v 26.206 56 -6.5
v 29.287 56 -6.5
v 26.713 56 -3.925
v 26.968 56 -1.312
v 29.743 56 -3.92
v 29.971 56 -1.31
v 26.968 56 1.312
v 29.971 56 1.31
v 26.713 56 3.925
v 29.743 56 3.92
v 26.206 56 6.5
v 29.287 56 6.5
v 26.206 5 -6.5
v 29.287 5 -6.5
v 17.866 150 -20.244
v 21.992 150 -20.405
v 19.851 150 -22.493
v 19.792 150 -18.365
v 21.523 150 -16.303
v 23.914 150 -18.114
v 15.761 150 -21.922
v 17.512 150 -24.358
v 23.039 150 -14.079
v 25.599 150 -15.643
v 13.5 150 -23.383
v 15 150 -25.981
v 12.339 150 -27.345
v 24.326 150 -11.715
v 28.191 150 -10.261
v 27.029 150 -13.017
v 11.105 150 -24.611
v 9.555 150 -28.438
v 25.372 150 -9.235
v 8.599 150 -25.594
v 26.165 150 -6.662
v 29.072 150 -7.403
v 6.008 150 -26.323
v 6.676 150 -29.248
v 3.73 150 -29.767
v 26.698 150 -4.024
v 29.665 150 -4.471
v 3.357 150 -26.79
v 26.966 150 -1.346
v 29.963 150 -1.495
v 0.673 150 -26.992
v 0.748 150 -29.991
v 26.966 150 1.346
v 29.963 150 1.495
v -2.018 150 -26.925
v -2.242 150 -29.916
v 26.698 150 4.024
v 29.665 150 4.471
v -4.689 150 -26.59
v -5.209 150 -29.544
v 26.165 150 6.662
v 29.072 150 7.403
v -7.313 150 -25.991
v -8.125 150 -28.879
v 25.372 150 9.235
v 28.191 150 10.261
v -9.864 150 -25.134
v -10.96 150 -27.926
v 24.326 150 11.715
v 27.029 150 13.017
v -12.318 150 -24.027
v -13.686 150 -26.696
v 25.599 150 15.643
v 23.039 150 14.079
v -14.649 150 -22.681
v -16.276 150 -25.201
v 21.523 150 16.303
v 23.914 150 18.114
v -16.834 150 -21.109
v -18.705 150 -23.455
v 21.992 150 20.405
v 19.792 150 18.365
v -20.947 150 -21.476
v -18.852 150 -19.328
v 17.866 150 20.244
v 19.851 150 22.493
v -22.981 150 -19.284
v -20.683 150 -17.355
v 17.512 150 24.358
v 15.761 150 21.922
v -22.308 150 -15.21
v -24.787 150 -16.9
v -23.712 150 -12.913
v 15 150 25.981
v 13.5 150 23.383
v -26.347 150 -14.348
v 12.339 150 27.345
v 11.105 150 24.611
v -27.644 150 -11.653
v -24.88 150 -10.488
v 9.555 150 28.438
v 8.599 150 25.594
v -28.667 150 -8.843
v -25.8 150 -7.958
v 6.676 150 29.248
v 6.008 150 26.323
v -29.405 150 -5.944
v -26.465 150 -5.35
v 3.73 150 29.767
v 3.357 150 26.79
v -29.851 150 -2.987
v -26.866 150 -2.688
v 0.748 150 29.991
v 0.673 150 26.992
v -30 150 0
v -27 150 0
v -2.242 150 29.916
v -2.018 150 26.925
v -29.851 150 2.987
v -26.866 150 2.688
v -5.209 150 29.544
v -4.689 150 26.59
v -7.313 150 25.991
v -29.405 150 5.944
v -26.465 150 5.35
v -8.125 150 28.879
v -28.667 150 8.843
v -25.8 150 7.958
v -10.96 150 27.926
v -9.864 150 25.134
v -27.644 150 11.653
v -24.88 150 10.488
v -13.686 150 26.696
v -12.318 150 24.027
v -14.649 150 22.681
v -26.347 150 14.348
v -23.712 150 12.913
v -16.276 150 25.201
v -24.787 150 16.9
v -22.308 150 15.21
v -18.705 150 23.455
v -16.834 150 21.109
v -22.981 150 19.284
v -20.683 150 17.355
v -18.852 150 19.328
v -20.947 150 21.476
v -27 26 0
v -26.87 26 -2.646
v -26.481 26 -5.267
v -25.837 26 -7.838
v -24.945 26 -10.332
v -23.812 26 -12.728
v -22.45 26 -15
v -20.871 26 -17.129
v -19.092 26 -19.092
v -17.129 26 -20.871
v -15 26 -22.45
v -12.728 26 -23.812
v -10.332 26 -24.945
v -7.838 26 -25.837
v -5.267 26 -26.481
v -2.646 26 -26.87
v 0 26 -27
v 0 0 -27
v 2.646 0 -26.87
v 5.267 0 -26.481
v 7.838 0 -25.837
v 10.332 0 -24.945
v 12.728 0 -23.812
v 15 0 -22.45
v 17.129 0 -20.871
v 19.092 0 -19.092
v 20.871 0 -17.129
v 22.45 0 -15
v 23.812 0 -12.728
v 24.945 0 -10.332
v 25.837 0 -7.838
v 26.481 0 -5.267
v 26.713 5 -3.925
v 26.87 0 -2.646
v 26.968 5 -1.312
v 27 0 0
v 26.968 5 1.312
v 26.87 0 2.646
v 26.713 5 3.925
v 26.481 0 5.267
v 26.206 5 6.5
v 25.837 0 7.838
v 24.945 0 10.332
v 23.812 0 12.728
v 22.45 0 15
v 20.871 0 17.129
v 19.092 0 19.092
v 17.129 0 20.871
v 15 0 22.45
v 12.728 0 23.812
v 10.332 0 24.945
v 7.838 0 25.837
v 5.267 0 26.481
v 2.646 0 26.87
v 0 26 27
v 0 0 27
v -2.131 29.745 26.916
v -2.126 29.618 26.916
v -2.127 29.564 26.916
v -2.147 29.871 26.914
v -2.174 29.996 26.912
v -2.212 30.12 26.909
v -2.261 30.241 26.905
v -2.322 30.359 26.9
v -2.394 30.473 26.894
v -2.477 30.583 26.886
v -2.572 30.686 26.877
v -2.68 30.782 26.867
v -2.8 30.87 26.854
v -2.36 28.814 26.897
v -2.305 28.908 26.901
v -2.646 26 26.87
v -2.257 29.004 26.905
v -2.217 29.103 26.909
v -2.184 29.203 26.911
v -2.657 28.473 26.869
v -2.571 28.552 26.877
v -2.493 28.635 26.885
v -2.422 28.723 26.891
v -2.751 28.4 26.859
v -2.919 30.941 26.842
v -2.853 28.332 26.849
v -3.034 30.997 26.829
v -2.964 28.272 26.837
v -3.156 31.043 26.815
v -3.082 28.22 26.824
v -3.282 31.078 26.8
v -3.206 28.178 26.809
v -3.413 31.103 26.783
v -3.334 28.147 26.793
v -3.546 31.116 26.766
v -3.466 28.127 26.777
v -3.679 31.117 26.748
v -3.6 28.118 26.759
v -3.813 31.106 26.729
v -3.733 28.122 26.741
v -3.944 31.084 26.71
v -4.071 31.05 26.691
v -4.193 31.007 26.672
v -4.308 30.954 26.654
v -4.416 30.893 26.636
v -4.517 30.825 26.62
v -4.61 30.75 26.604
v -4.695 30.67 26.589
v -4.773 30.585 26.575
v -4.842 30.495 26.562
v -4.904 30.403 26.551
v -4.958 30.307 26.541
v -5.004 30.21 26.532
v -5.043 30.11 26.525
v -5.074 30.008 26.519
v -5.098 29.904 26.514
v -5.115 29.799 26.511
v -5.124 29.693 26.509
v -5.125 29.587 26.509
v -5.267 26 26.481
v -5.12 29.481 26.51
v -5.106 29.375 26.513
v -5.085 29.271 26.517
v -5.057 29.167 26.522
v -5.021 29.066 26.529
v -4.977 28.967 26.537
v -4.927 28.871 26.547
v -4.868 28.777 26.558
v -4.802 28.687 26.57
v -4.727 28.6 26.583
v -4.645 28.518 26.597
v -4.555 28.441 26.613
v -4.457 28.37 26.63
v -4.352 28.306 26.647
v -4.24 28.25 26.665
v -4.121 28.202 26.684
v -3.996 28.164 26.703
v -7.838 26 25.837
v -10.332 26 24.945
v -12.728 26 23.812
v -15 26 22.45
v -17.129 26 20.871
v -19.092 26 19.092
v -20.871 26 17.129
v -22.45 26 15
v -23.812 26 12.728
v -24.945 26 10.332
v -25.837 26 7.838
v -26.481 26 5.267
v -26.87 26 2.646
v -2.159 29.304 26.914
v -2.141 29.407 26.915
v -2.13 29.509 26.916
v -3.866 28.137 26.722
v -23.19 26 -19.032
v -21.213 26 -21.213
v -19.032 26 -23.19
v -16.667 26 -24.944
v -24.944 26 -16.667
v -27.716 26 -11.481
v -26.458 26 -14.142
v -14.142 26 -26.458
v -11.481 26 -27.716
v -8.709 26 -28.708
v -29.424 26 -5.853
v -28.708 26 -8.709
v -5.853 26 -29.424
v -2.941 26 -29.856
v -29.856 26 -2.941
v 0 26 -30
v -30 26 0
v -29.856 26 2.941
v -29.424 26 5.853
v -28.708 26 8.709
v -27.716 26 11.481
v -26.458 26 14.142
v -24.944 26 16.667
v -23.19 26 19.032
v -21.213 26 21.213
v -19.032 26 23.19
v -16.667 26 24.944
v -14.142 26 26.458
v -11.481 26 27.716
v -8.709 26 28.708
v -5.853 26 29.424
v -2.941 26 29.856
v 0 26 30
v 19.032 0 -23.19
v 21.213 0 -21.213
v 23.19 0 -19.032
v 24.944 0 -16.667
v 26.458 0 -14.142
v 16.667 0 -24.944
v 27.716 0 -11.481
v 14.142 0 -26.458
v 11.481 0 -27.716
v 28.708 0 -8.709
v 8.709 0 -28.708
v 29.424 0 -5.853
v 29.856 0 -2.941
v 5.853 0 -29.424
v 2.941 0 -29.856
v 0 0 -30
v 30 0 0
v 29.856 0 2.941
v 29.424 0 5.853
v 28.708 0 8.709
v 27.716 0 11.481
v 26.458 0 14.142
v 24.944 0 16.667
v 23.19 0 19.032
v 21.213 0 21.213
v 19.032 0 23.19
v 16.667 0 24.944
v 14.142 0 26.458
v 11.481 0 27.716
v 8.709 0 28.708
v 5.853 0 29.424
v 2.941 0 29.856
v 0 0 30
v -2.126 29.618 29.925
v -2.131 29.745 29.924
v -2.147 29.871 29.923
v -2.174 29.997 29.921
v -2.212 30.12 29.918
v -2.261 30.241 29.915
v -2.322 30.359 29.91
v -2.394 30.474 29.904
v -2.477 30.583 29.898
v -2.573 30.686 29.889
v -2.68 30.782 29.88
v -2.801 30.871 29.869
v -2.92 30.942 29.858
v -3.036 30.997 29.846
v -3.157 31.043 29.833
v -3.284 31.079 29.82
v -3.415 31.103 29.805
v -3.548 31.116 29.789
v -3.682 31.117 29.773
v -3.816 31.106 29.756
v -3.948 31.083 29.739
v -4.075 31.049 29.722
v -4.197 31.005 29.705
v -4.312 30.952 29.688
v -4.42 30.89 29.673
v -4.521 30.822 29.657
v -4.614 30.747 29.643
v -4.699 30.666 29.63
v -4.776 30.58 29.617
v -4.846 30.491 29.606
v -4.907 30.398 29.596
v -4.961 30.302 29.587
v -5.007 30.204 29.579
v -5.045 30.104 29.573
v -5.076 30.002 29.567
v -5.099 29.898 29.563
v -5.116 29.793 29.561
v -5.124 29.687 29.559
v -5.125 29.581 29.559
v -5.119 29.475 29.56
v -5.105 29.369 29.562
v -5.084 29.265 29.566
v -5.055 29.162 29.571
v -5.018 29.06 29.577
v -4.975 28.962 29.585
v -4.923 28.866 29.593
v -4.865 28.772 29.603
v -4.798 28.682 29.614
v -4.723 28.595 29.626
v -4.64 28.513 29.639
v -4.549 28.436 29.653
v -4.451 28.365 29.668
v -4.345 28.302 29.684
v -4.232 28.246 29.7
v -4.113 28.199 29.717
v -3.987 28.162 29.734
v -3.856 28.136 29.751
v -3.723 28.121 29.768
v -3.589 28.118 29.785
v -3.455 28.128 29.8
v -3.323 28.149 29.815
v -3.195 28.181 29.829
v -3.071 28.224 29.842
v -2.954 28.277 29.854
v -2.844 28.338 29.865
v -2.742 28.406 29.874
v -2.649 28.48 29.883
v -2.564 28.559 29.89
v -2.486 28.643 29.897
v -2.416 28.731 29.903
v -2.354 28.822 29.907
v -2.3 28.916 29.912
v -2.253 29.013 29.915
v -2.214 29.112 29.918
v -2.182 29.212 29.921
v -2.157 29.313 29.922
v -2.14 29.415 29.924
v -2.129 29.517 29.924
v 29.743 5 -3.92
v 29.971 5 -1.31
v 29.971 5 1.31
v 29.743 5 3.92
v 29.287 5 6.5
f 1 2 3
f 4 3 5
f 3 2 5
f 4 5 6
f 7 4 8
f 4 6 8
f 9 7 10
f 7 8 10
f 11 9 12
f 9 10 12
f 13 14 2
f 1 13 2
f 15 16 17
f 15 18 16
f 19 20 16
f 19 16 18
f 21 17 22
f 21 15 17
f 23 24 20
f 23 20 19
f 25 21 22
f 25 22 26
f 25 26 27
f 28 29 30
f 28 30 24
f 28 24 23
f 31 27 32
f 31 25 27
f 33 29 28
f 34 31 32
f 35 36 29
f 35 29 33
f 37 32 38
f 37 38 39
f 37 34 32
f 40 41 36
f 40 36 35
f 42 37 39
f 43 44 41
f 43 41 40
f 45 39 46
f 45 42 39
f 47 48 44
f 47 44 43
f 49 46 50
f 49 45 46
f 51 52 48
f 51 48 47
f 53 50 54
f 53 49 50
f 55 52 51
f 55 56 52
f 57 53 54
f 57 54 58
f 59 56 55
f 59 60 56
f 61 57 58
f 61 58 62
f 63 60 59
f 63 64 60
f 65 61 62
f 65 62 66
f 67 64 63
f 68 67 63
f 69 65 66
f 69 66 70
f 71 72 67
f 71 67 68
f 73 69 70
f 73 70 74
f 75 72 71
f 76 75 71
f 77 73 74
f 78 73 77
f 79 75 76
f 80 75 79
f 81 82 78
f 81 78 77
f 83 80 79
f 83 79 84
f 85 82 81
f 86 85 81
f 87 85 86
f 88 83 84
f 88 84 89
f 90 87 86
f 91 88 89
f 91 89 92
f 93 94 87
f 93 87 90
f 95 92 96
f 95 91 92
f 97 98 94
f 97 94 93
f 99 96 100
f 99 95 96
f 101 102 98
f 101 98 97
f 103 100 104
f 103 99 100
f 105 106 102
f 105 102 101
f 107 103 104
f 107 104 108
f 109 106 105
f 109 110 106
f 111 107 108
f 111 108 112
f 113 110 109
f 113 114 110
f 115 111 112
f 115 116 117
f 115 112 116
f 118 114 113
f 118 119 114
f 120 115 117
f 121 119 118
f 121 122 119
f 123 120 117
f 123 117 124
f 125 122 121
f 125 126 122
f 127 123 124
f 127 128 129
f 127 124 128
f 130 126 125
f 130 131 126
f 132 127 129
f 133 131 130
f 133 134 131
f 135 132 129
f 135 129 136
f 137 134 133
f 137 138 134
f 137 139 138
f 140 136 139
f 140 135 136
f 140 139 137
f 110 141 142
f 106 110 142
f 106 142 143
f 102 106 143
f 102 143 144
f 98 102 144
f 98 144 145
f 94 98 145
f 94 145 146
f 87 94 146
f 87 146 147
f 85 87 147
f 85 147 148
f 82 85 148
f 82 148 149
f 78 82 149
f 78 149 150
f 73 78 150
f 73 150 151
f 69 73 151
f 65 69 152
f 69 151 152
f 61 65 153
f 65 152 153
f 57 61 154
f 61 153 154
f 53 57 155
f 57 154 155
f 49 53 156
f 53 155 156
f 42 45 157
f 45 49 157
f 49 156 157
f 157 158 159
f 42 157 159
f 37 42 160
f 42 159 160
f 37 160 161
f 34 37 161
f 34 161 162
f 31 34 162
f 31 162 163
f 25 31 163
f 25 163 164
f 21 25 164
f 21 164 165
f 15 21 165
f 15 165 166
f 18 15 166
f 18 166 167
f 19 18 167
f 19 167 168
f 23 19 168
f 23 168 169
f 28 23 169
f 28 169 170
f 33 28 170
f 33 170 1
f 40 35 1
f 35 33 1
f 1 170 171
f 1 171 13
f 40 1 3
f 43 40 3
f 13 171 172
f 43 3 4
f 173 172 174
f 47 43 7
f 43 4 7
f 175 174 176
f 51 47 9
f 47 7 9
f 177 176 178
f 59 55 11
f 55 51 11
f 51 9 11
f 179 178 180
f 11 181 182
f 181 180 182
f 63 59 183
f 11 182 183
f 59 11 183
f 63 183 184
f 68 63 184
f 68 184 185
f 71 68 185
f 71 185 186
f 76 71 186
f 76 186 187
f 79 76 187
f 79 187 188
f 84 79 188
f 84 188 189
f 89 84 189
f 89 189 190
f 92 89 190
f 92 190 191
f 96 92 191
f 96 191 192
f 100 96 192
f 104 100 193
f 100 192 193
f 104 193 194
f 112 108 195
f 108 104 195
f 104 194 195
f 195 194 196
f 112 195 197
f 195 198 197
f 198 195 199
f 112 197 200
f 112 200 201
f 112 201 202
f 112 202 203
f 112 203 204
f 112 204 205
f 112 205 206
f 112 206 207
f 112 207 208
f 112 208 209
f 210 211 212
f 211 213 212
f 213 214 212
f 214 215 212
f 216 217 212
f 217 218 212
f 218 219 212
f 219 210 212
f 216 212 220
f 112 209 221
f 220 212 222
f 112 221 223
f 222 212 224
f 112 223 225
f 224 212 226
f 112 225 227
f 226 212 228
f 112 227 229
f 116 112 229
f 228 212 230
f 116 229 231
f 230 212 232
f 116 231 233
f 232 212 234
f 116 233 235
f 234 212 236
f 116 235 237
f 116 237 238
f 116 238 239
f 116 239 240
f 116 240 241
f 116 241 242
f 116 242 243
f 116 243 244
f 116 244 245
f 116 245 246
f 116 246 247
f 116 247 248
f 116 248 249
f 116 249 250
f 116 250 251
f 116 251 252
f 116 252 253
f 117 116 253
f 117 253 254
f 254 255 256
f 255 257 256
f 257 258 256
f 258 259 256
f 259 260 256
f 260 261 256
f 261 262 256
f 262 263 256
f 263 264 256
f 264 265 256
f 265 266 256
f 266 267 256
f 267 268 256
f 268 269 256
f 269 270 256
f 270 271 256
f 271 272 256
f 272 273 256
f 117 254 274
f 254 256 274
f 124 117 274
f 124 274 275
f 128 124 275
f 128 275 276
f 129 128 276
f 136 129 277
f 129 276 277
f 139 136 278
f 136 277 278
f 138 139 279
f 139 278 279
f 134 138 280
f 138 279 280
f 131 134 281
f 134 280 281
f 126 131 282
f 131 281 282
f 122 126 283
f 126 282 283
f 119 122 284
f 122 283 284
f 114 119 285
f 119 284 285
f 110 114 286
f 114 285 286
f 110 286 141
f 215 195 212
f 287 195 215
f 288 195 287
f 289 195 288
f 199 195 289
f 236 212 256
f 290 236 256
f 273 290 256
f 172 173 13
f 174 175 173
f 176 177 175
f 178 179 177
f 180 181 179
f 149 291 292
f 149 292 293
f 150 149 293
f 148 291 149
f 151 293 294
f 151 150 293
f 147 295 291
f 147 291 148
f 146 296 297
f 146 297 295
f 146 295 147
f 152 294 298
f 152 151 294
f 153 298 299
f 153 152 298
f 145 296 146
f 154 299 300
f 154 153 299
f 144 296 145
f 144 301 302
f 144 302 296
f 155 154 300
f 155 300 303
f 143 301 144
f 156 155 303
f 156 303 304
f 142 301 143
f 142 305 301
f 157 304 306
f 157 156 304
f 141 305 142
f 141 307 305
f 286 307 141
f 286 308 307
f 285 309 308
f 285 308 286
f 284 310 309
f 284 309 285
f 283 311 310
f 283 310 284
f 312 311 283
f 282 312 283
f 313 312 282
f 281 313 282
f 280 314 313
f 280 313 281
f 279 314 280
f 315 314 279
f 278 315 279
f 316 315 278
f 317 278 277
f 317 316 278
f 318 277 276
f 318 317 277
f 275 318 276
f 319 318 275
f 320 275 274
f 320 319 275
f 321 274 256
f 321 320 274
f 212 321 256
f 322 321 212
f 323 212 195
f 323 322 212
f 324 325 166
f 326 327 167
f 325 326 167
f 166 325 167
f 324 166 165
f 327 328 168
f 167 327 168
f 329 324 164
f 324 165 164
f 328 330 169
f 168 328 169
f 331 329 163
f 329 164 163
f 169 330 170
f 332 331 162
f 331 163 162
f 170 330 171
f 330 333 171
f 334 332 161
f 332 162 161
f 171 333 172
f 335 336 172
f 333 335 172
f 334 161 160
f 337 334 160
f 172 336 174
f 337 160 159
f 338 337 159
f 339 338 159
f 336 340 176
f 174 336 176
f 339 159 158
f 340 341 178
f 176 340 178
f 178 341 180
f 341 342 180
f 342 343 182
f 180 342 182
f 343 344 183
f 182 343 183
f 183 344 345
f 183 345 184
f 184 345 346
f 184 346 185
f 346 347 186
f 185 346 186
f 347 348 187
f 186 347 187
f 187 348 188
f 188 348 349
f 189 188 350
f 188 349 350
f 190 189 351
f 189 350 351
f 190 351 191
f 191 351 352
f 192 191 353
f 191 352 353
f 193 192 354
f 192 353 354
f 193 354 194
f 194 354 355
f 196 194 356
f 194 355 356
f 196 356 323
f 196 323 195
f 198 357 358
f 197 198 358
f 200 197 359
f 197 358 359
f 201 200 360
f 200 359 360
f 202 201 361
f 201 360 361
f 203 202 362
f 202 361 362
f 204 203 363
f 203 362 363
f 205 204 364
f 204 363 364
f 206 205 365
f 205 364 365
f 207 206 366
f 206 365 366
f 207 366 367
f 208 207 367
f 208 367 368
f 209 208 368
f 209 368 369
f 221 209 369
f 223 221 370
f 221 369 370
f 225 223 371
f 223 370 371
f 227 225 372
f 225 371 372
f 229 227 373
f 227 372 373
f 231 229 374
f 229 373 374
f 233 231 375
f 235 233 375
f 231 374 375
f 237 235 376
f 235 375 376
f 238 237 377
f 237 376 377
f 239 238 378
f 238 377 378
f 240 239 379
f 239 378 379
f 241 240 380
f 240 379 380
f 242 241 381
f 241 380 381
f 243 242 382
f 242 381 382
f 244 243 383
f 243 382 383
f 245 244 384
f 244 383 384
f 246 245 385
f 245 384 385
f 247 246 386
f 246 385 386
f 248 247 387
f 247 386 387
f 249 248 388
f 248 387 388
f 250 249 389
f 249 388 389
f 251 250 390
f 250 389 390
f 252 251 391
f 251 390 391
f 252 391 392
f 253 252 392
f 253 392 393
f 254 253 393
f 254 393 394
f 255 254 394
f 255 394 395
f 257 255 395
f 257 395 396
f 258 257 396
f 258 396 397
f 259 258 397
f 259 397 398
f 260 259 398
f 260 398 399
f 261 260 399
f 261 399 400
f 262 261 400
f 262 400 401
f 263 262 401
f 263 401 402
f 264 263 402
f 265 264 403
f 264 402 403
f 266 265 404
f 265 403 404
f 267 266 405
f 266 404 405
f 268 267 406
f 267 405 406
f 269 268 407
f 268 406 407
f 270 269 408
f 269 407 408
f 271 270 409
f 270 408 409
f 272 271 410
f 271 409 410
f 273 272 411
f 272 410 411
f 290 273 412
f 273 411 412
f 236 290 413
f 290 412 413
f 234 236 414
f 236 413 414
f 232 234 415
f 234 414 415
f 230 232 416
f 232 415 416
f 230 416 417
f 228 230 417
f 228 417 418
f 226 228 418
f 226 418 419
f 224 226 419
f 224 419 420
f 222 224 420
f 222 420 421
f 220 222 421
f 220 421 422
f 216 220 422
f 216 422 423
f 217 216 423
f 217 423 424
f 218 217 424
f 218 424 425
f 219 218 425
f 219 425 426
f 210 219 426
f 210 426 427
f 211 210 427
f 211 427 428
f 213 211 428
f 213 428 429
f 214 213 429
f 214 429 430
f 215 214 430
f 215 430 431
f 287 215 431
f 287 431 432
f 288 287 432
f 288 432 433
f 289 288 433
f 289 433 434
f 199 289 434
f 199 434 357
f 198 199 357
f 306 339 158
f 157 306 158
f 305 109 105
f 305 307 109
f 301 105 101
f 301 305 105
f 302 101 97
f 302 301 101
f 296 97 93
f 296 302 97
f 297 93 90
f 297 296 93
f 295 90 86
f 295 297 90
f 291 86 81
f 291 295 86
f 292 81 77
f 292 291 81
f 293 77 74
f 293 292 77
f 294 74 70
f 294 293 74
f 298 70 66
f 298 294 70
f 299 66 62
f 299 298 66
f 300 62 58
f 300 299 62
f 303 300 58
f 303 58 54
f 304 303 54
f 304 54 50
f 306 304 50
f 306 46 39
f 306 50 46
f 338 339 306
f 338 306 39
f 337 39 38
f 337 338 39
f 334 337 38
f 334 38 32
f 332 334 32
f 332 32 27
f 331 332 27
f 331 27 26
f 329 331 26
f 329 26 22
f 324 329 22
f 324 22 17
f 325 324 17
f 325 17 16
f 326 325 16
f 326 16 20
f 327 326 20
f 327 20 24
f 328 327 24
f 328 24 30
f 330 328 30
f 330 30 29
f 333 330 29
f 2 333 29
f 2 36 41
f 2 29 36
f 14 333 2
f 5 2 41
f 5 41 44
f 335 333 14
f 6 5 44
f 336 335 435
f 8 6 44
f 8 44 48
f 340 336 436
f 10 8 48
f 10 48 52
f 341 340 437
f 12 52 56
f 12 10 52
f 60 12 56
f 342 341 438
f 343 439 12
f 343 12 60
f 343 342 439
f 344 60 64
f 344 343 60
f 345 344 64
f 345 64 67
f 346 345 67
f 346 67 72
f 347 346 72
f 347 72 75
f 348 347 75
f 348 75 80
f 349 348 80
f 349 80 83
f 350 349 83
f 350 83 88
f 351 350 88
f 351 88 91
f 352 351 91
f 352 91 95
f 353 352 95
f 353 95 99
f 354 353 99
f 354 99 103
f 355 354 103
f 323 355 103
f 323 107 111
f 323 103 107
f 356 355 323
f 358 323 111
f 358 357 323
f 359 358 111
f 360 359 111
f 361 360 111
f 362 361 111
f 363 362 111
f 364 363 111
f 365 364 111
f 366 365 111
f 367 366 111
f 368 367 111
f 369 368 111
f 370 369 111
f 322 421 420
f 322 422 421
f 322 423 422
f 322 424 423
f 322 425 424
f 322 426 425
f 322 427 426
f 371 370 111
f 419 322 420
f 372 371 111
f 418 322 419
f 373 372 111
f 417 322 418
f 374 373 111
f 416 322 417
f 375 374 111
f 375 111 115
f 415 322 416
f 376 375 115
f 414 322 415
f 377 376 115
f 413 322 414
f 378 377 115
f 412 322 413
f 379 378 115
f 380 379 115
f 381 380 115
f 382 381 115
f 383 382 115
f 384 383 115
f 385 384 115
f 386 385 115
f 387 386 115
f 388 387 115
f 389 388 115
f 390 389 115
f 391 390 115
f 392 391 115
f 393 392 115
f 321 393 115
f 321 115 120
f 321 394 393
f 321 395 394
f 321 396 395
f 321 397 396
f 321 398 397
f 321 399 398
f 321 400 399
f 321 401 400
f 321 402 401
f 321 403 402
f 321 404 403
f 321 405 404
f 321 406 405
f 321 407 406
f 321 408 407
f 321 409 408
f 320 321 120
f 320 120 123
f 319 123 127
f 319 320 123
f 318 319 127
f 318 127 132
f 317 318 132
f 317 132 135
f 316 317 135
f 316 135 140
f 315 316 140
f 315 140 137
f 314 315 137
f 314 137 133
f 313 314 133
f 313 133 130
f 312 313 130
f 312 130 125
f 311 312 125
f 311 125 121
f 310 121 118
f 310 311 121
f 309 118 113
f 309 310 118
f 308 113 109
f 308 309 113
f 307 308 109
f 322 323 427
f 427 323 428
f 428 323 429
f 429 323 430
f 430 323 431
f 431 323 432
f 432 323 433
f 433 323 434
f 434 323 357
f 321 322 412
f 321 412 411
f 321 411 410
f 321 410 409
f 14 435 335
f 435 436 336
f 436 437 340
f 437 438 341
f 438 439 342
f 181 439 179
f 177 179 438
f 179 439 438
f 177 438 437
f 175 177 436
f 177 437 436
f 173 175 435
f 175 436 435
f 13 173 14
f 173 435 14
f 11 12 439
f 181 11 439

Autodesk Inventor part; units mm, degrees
ref_plane "XZ Plane" through (0, 0, 0) normal (0, 1, 0) x (-1, 0, 0)
sketch "Esquisse1" plane through (0, 0, 0) normal (0, 1, 0) x (-1, 0, 0)
  circle A0 centre (0, 0) radius 27
  circle A1 centre (0, 0) radius 30
  dimension "d0" = 60
  dimension "d1" = 54
extrude "Extrusion1" add sketch "Esquisse1" along normal blind 150
ref_plane "Plan de construction1" through (30, 0, 0) normal (1, 0, 0) x (0, 1, 0)
sketch "Esquisse2" plane through (30, 0, 0) normal (1, 0, 0) x (0, 1, 0)
  line L0 (56, 6.5) -> (5, 6.5)
  line L1 (5, 6.5) -> (5, -6.5)
  line L2 (5, -6.5) -> (56, -6.5)
  line L3 (56, -6.5) -> (56, 6.5)
  line L4 (0, -27) -> (0, 27) projected
  line L5 (-11.2, 0) -> (67.2, 0) projected
  point P0 (0, 0)
  dimension "d5" = 5
  dimension "d6" = 51
  dimension "d7" = 13
  dimension "d8" = 6.5
extrude "Extrusion2" cut sketch "Esquisse2" against normal blind 10
sketch "Esquisse3" plane through (0, 0, 0) normal (0, -1, 0) x (1, 0, 0)
  circle A0 centre (0, 0) radius 27 projected
  arc A1 (0, 27) -> (0, -27) centre (0, 0) ccw
  circle A2 centre (0, 0) radius 30 projected
  arc A3 (0, 30) -> (0, -30) centre (0, 0) ccw
  line L0 (0, 30) -> (0, 27)
  line L1 (0, -30) -> (0, -27)
extrude "Extrusion3" cut sketch "Esquisse3" against normal blind 26 contours A0 L1 A2 L0 picked at (-4.547, -28.4479)
ref_plane "Work Plane2" through (0, 0, 30) normal (0, 0, 1) x (1, 0, 0)
sketch "Sketch4" plane through (0, 0, 30) normal (0, 0, 1) x (1, 0, 0)
  circle A0 centre (-3.6258, 29.618) radius 1.5 projected
  point P0 (0, 0)
extrude "Extrusion4" cut sketch "Sketch4" against normal up to next
properties part number "cylindre-lanceur"
